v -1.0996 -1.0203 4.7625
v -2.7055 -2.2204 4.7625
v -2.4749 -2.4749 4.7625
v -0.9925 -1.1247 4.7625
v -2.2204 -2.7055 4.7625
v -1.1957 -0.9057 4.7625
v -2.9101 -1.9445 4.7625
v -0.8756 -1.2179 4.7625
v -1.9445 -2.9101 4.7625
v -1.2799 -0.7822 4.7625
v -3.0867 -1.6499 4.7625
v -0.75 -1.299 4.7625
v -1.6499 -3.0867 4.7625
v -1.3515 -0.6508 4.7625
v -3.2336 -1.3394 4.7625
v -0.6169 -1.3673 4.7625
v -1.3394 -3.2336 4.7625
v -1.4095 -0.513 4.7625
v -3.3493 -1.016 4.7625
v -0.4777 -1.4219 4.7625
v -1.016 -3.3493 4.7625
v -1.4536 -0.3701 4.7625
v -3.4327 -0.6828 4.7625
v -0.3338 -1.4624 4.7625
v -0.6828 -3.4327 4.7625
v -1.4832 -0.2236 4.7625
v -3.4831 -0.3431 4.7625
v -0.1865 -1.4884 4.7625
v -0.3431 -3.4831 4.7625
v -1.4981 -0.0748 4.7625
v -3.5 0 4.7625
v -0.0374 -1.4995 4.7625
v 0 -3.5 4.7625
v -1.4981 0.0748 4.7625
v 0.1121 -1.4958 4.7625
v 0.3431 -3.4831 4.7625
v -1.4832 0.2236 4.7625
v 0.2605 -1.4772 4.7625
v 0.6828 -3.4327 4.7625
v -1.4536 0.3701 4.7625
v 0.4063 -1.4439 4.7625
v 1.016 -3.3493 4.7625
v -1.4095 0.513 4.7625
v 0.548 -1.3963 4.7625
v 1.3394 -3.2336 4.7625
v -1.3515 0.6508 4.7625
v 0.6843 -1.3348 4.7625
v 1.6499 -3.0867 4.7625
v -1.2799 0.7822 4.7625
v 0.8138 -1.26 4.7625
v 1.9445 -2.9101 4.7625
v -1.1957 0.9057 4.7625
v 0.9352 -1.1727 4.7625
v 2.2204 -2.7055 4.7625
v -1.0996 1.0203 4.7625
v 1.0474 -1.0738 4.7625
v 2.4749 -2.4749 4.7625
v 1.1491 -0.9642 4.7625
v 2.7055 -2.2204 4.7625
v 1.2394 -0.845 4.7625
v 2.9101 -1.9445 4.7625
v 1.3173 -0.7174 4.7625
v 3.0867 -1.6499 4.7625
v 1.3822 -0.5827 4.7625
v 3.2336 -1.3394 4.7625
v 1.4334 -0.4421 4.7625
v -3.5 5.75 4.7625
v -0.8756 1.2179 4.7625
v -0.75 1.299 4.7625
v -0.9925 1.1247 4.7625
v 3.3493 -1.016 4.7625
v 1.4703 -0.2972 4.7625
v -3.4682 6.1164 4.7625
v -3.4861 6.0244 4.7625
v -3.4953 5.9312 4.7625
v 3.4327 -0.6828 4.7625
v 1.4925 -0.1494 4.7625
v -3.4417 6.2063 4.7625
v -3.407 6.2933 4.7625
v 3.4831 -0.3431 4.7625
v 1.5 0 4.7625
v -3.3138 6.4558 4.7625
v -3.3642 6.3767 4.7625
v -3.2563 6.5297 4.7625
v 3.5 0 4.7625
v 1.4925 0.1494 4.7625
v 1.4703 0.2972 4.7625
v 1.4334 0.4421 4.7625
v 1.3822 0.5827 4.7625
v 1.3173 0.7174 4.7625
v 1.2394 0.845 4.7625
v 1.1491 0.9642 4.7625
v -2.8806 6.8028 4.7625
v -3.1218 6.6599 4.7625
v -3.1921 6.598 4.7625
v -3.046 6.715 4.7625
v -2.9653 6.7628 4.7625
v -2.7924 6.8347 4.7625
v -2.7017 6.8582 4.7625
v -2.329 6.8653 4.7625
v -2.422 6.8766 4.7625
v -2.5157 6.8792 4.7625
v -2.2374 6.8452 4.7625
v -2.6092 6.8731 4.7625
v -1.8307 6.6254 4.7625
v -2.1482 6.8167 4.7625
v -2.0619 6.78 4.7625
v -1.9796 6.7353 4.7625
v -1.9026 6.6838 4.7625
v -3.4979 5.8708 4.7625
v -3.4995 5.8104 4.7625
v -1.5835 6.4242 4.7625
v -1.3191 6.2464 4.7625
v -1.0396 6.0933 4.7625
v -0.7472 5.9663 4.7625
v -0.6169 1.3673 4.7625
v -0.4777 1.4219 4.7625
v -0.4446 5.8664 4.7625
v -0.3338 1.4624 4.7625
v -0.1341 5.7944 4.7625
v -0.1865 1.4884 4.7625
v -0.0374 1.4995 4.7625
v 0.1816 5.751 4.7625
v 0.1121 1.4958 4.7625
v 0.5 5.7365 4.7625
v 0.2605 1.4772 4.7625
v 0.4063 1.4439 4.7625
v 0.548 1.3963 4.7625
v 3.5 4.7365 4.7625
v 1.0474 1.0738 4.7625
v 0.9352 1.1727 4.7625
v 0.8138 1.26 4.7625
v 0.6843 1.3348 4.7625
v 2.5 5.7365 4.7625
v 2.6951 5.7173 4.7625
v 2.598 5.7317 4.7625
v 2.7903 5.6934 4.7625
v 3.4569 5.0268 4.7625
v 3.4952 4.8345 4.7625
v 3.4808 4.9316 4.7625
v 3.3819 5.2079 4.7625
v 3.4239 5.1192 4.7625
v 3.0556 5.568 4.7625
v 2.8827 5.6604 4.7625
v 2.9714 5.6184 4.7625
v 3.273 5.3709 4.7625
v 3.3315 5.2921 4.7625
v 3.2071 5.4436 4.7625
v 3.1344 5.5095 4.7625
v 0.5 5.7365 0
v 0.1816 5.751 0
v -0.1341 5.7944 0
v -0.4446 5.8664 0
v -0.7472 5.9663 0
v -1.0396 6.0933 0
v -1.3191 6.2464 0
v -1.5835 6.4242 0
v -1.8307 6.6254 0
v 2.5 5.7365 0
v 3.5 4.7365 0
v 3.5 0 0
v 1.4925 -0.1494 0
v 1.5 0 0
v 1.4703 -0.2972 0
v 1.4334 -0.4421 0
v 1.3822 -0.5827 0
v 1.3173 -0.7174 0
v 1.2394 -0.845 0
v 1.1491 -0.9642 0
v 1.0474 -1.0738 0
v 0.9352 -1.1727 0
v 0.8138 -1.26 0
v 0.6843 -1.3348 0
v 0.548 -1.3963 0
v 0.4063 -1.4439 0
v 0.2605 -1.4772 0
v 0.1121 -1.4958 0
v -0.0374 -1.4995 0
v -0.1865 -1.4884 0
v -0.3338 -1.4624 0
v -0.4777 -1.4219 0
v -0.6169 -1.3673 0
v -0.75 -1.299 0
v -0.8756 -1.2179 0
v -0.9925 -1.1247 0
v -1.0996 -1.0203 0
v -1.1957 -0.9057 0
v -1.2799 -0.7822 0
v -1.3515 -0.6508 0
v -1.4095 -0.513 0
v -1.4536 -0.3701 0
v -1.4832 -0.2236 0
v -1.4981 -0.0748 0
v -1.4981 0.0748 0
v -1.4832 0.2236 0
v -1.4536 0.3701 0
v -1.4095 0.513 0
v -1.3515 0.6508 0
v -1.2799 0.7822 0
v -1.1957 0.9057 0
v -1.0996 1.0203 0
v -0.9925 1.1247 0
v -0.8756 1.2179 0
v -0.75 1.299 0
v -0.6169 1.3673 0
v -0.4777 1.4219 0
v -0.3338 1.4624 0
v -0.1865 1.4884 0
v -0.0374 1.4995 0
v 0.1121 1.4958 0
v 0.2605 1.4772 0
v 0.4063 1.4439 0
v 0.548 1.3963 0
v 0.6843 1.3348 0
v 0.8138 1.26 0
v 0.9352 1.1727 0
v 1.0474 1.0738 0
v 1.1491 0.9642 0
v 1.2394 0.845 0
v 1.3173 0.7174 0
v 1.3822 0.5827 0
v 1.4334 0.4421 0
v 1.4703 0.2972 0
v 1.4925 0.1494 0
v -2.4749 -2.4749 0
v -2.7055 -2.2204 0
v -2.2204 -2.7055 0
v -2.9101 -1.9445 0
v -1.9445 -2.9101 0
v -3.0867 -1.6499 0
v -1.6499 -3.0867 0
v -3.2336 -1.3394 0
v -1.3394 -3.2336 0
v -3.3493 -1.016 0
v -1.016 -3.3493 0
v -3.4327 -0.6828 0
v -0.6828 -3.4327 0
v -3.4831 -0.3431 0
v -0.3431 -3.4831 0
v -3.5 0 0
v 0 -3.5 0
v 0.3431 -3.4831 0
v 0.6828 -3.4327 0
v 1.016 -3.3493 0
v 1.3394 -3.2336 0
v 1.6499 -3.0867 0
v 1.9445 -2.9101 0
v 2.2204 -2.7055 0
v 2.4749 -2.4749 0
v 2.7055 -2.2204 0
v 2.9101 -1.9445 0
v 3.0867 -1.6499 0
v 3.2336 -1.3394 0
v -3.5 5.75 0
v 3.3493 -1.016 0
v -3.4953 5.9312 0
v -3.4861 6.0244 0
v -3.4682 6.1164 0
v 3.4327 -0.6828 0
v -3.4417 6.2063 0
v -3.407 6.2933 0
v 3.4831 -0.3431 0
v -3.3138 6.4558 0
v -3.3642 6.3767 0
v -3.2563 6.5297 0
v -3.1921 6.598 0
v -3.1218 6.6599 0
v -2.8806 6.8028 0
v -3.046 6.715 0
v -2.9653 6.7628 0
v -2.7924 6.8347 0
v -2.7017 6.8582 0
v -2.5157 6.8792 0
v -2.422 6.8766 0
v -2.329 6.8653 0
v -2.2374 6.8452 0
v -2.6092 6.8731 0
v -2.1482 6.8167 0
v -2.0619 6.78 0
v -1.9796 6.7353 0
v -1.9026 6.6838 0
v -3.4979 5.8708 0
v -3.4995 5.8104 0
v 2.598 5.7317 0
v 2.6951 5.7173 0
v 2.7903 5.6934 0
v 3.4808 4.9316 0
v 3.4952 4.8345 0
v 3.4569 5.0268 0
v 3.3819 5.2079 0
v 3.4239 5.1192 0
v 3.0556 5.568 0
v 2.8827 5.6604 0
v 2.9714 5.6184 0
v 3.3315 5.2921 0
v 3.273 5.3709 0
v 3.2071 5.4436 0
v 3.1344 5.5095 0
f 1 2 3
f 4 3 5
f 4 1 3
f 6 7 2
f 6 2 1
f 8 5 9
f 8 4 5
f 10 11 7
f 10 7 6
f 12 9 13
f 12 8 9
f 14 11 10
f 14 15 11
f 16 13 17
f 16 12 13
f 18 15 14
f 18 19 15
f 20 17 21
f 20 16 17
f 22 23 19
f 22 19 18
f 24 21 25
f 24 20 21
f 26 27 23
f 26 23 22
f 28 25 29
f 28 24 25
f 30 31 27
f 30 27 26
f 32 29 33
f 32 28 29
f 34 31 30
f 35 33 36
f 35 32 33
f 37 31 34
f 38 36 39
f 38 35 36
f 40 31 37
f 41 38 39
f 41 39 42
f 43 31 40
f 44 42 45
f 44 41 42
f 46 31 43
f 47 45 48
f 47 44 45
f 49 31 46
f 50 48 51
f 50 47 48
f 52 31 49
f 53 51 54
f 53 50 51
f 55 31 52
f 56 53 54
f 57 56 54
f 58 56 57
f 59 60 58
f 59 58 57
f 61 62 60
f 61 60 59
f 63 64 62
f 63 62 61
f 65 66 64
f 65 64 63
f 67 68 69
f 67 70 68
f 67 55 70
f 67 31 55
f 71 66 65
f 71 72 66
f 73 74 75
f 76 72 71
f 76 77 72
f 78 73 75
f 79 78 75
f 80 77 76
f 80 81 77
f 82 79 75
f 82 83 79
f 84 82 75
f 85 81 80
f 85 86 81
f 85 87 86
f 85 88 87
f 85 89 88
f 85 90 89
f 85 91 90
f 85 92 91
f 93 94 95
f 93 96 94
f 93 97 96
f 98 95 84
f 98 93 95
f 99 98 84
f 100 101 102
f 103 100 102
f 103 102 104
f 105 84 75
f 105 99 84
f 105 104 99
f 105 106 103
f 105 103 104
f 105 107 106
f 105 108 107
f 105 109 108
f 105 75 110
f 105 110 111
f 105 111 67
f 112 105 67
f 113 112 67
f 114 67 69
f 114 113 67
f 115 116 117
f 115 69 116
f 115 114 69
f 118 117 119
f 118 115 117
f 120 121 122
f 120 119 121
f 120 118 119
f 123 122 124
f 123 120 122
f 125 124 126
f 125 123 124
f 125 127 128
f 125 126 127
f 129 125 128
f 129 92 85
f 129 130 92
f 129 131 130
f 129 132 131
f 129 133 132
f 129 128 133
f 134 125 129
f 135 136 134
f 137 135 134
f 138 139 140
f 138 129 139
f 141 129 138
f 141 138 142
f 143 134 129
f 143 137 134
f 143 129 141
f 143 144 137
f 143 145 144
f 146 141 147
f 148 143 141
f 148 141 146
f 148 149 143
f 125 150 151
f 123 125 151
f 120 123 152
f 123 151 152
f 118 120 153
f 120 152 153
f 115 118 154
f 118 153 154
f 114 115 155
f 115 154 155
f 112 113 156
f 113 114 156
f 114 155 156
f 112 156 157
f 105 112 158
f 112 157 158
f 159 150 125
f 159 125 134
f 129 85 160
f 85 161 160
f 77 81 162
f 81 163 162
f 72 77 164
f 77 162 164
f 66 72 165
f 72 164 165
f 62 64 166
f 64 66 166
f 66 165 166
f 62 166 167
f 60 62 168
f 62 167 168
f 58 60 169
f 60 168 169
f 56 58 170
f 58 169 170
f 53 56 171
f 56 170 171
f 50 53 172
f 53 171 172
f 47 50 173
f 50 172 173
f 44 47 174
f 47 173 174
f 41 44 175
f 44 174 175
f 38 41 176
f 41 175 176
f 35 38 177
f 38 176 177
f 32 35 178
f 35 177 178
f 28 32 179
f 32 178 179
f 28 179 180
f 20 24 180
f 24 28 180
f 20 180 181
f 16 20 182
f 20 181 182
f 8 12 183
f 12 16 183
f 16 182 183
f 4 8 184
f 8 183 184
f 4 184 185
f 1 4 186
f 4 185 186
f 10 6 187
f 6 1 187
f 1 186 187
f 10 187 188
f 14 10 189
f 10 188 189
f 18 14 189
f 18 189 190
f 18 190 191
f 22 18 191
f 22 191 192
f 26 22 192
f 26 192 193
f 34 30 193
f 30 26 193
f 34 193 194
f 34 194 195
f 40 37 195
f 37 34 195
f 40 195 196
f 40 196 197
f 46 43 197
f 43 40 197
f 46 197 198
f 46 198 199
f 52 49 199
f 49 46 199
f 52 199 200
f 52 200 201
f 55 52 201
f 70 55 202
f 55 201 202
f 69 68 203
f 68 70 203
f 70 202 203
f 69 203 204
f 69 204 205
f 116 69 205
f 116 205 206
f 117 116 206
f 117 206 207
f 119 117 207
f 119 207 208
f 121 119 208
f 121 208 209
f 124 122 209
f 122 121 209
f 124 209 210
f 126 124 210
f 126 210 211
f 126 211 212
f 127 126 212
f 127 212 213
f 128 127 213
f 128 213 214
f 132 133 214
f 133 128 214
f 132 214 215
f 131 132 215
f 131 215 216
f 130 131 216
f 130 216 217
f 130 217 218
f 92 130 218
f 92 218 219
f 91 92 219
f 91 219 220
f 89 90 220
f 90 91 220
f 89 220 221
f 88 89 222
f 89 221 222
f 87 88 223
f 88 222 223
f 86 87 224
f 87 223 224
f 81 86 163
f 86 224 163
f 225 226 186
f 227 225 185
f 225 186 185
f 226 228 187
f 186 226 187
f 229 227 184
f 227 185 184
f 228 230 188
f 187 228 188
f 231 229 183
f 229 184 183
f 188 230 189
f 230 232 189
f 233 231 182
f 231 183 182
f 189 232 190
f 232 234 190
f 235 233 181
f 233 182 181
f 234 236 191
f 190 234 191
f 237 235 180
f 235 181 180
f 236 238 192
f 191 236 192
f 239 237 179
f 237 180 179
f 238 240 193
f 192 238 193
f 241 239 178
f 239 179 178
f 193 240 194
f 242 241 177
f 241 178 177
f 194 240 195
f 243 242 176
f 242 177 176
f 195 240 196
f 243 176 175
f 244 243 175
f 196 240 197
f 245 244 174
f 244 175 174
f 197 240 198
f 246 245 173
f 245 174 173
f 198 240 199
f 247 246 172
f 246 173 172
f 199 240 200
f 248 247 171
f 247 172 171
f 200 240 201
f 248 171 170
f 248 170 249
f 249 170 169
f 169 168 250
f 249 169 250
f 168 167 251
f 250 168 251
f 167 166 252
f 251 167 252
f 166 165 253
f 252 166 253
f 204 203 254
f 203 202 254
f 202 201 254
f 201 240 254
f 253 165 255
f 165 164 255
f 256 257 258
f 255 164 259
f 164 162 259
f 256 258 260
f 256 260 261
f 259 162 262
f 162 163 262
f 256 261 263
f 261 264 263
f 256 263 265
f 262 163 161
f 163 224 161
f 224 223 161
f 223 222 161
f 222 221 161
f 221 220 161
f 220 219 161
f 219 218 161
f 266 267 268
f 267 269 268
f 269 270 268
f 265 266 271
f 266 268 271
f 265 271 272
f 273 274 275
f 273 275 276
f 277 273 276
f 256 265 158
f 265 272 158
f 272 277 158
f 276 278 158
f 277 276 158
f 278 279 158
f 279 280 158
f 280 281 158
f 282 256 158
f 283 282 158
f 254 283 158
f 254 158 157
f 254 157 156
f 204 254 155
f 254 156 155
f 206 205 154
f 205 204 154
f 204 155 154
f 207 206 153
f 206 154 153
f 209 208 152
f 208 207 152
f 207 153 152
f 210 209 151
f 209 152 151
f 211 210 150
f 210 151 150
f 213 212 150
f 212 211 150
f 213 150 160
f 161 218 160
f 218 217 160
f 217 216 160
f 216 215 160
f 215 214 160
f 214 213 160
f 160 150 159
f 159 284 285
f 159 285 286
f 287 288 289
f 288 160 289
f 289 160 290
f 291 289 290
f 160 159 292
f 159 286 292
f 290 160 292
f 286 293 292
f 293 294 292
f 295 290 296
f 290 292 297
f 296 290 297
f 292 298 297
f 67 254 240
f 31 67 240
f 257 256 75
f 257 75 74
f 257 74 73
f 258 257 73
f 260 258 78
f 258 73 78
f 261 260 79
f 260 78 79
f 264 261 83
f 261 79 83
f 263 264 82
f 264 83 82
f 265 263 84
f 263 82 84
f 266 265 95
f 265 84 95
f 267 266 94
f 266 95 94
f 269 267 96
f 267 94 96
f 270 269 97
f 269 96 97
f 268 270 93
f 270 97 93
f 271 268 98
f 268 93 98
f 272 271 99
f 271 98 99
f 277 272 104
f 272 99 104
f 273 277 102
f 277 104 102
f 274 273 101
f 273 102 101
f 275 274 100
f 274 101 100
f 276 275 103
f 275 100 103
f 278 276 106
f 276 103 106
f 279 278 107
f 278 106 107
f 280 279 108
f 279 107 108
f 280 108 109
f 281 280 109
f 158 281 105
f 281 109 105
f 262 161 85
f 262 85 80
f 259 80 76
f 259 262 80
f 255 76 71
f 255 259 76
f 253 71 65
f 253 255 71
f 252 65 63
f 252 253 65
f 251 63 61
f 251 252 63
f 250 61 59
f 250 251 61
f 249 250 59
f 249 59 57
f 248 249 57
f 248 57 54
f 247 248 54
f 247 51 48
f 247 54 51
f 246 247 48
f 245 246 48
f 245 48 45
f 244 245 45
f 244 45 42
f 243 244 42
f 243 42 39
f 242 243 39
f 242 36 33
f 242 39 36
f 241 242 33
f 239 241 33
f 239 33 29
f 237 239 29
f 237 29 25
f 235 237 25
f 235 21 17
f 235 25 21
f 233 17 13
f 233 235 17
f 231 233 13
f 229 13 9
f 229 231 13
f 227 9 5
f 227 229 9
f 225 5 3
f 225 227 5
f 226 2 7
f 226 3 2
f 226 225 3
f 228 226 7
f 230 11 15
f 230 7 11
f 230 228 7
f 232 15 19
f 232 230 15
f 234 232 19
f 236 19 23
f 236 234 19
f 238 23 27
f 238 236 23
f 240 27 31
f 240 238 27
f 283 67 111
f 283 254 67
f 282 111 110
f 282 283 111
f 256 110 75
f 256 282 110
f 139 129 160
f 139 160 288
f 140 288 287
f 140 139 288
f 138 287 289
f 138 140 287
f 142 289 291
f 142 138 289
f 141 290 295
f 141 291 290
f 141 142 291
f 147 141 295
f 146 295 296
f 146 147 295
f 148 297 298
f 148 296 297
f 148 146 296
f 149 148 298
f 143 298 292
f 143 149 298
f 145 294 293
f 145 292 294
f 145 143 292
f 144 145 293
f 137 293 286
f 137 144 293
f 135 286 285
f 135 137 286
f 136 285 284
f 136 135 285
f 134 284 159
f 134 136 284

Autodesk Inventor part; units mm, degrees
ref_plane "YZ Plane" through (0, 0, 0) normal (1, 0, 0) x (0, 1, 0)
ref_plane "XZ Plane" through (0, 0, 0) normal (0, 1, 0) x (-1, 0, 0)
ref_plane "XY Plane" through (0, 0, 0) normal (0, 0, 1) x (1, 0, 0)
sketch "Sketch1" plane through (0, 0, 0) normal (0, 0, 1) x (1, 0, 0)
  circle A0 centre (0, 0) radius 1.5
  circle A1 centre (0, 0) radius 3.5
  circle A2 centre (0, 0) radius 5.75 construction
  line L0 (0, 0) -> (0, 5.75) construction
  circle A3 centre (0.5, 9.2365) radius 3.5
  line L1 (0, 0) -> (0, 5.75) construction
  line L2 (3.5, 0) -> (3.5, 5.75)
  line L3 (-3.5, 5.75) -> (-3.5, 0)
  arc A4 (-3.5, 0) -> (3.5, 0) centre (0, 0) ccw
  arc A5 (3.5, 5.75) -> (-1.9961, 2.875) centre (0, 5.75) ccw
  arc A6 (-3.4062, 0.805) -> (-3.4062, 4.945) centre (-12.1649, 2.875) ccw
  line L4 (0.5, 5.7365) -> (3.5, 5.7365)
  point P0 (0, 2.875)
  point P1 (-3.4345, 6.424)
  point P2 (3.5, 0)
  point P3 (3.244, 7.0639)
  point P4 (-3.5, 0)
  point P5 (-2.744, 7.9226)
  dimension "d2" = 11.5
  dimension "d3" = 7
  dimension "d0" = 3
  dimension "d1" = 7
  dimension "d4" = 3.5
  dimension "d9" = 0.5
  dimension "d10" = 9
extrude "Extrusion1" add sketch "Sketch1" along normal blind 4.7625 contours A1 | A1 A5 A3 L4 L2 | A1 A6 A5 | L3 A5 A6 A1
fillet "Fillet1" radius 1 1 edges at (-2.744, 7.9226, 2.3813)
fillet "Fillet2" radius 1 1 edges at (3.5, 5.7365, 2.3813)
sketch "Sketch2" plane through (0, 0, 0) normal (0, 0, -1) x (-1, 0, 0)
  line L0 (-3.5, 0) -> (-3.5, 4.7365) projected
  arc A0 (-3.5, 0) -> (3.5, 0) centre (0, 0) ccw projected
  circle A1 centre (0, 0) radius 1.5 projected
  circle A2 centre (0, 0) radius 6.3558 construction
  arc A3 (3.4953, 5.9311) -> (1.8307, 6.6254) centre (2.4966, 5.8794) ccw projected
  arc A4 (-0.5, 5.7365) -> (1.8307, 6.6254) centre (-0.5, 9.2365) ccw projected
  line L1 (3.5, 5.75) -> (3.5, 0) projected
  line L2 (-2.5, 5.7365) -> (-0.5, 5.7365) projected
  arc A5 (-2.5, 5.7365) -> (-3.5, 4.7365) centre (-2.5, 4.7365) ccw projected
  arc A6 (-2.5, 5.7365) -> (-3.5, 4.7365) centre (-2.5, 4.7365) ccw projected
  arc A7 (3.5, 5.75) -> (3.4953, 5.9311) centre (0, 5.75) ccw projected
equation "\"d4\" = 0.5 * d1"
properties part number "Cam - Lever" material "Nylon 6/6"
